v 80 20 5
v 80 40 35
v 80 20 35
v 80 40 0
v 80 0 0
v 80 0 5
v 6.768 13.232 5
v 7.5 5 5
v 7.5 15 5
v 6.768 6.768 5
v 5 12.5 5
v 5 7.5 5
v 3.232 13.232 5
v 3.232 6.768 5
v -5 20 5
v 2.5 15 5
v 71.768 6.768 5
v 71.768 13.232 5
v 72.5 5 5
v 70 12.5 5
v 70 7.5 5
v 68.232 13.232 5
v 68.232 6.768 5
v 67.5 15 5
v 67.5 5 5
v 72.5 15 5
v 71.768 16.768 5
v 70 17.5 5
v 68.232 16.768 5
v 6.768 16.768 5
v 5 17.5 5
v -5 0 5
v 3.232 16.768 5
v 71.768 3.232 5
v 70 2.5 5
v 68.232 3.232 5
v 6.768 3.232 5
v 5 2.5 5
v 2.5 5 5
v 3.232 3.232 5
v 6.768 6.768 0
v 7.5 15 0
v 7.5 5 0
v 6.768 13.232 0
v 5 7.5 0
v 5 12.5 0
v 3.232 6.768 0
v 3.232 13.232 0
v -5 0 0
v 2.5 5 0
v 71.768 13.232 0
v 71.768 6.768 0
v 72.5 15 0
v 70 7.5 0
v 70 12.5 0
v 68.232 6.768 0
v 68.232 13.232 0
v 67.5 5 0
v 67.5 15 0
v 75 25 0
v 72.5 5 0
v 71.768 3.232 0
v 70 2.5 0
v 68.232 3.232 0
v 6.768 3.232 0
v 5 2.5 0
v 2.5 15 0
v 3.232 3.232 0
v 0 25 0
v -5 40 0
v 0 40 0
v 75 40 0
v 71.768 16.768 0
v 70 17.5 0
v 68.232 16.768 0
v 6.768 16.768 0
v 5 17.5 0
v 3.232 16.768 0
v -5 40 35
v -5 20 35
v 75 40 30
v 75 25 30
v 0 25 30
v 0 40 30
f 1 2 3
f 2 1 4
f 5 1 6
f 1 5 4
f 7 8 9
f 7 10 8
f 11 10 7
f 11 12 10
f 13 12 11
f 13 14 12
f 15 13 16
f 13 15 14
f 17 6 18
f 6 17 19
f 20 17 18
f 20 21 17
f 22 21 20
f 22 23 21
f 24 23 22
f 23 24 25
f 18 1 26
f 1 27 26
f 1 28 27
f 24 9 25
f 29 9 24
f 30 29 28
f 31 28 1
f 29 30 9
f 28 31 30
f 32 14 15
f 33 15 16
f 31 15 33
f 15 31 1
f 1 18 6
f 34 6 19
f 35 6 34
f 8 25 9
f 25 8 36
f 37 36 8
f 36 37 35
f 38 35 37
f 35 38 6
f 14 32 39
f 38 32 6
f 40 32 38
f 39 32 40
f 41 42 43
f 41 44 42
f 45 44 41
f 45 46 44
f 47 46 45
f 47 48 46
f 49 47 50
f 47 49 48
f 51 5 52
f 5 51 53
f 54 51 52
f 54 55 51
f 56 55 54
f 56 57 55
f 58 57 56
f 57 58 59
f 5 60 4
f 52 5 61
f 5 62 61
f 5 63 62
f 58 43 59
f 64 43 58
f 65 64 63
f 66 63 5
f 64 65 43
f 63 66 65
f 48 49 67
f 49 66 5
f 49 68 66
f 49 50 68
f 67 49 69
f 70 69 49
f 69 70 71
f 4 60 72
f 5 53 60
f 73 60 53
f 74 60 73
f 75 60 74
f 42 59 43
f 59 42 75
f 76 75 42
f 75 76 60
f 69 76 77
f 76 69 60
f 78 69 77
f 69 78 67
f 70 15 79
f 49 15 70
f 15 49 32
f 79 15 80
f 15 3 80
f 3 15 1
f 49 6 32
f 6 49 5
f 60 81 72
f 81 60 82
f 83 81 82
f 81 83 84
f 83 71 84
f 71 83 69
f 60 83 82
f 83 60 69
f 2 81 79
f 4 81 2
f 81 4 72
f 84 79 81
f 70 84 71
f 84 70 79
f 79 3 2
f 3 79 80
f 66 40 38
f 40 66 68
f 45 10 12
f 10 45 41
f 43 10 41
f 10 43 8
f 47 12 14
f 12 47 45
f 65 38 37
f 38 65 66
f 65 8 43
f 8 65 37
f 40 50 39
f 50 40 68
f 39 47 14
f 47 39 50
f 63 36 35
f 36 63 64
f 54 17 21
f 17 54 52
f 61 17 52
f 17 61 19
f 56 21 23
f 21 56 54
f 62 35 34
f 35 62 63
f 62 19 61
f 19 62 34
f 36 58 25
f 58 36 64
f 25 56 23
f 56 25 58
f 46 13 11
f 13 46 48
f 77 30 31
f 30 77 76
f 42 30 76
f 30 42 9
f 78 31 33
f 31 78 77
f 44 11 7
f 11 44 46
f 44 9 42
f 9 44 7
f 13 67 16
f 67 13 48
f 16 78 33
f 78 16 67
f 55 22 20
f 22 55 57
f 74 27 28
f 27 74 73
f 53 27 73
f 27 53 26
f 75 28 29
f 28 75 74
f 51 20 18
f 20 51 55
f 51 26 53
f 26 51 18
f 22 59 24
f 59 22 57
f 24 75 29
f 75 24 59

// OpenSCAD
/// A mounting bracket for everything you can think of,
/// but mainly an Anker PowerPort.

difference() {
  union() {
    translate([-5, 0, 0])
      cube([85, 20, 5]);
    translate([0, 20, 0])
      cube([75, 5, 30]);
    translate([-5, 20, 0])
      cube([5, 20, 30]);
    translate([75, 20, 0])
      cube([5, 20, 30]);
    translate([-5, 20, 30])
      cube([85, 20, 5]);
  }
  translate([5, 5, 0])
    cylinder(h=5, r=2.5);
  translate([70, 5, 0])
    cylinder(h=5, r=2.5);
  translate([5, 15, 0])
    cylinder(h=5, r=2.5);
  translate([70, 15, 0])
    cylinder(h=5, r=2.5);
}
